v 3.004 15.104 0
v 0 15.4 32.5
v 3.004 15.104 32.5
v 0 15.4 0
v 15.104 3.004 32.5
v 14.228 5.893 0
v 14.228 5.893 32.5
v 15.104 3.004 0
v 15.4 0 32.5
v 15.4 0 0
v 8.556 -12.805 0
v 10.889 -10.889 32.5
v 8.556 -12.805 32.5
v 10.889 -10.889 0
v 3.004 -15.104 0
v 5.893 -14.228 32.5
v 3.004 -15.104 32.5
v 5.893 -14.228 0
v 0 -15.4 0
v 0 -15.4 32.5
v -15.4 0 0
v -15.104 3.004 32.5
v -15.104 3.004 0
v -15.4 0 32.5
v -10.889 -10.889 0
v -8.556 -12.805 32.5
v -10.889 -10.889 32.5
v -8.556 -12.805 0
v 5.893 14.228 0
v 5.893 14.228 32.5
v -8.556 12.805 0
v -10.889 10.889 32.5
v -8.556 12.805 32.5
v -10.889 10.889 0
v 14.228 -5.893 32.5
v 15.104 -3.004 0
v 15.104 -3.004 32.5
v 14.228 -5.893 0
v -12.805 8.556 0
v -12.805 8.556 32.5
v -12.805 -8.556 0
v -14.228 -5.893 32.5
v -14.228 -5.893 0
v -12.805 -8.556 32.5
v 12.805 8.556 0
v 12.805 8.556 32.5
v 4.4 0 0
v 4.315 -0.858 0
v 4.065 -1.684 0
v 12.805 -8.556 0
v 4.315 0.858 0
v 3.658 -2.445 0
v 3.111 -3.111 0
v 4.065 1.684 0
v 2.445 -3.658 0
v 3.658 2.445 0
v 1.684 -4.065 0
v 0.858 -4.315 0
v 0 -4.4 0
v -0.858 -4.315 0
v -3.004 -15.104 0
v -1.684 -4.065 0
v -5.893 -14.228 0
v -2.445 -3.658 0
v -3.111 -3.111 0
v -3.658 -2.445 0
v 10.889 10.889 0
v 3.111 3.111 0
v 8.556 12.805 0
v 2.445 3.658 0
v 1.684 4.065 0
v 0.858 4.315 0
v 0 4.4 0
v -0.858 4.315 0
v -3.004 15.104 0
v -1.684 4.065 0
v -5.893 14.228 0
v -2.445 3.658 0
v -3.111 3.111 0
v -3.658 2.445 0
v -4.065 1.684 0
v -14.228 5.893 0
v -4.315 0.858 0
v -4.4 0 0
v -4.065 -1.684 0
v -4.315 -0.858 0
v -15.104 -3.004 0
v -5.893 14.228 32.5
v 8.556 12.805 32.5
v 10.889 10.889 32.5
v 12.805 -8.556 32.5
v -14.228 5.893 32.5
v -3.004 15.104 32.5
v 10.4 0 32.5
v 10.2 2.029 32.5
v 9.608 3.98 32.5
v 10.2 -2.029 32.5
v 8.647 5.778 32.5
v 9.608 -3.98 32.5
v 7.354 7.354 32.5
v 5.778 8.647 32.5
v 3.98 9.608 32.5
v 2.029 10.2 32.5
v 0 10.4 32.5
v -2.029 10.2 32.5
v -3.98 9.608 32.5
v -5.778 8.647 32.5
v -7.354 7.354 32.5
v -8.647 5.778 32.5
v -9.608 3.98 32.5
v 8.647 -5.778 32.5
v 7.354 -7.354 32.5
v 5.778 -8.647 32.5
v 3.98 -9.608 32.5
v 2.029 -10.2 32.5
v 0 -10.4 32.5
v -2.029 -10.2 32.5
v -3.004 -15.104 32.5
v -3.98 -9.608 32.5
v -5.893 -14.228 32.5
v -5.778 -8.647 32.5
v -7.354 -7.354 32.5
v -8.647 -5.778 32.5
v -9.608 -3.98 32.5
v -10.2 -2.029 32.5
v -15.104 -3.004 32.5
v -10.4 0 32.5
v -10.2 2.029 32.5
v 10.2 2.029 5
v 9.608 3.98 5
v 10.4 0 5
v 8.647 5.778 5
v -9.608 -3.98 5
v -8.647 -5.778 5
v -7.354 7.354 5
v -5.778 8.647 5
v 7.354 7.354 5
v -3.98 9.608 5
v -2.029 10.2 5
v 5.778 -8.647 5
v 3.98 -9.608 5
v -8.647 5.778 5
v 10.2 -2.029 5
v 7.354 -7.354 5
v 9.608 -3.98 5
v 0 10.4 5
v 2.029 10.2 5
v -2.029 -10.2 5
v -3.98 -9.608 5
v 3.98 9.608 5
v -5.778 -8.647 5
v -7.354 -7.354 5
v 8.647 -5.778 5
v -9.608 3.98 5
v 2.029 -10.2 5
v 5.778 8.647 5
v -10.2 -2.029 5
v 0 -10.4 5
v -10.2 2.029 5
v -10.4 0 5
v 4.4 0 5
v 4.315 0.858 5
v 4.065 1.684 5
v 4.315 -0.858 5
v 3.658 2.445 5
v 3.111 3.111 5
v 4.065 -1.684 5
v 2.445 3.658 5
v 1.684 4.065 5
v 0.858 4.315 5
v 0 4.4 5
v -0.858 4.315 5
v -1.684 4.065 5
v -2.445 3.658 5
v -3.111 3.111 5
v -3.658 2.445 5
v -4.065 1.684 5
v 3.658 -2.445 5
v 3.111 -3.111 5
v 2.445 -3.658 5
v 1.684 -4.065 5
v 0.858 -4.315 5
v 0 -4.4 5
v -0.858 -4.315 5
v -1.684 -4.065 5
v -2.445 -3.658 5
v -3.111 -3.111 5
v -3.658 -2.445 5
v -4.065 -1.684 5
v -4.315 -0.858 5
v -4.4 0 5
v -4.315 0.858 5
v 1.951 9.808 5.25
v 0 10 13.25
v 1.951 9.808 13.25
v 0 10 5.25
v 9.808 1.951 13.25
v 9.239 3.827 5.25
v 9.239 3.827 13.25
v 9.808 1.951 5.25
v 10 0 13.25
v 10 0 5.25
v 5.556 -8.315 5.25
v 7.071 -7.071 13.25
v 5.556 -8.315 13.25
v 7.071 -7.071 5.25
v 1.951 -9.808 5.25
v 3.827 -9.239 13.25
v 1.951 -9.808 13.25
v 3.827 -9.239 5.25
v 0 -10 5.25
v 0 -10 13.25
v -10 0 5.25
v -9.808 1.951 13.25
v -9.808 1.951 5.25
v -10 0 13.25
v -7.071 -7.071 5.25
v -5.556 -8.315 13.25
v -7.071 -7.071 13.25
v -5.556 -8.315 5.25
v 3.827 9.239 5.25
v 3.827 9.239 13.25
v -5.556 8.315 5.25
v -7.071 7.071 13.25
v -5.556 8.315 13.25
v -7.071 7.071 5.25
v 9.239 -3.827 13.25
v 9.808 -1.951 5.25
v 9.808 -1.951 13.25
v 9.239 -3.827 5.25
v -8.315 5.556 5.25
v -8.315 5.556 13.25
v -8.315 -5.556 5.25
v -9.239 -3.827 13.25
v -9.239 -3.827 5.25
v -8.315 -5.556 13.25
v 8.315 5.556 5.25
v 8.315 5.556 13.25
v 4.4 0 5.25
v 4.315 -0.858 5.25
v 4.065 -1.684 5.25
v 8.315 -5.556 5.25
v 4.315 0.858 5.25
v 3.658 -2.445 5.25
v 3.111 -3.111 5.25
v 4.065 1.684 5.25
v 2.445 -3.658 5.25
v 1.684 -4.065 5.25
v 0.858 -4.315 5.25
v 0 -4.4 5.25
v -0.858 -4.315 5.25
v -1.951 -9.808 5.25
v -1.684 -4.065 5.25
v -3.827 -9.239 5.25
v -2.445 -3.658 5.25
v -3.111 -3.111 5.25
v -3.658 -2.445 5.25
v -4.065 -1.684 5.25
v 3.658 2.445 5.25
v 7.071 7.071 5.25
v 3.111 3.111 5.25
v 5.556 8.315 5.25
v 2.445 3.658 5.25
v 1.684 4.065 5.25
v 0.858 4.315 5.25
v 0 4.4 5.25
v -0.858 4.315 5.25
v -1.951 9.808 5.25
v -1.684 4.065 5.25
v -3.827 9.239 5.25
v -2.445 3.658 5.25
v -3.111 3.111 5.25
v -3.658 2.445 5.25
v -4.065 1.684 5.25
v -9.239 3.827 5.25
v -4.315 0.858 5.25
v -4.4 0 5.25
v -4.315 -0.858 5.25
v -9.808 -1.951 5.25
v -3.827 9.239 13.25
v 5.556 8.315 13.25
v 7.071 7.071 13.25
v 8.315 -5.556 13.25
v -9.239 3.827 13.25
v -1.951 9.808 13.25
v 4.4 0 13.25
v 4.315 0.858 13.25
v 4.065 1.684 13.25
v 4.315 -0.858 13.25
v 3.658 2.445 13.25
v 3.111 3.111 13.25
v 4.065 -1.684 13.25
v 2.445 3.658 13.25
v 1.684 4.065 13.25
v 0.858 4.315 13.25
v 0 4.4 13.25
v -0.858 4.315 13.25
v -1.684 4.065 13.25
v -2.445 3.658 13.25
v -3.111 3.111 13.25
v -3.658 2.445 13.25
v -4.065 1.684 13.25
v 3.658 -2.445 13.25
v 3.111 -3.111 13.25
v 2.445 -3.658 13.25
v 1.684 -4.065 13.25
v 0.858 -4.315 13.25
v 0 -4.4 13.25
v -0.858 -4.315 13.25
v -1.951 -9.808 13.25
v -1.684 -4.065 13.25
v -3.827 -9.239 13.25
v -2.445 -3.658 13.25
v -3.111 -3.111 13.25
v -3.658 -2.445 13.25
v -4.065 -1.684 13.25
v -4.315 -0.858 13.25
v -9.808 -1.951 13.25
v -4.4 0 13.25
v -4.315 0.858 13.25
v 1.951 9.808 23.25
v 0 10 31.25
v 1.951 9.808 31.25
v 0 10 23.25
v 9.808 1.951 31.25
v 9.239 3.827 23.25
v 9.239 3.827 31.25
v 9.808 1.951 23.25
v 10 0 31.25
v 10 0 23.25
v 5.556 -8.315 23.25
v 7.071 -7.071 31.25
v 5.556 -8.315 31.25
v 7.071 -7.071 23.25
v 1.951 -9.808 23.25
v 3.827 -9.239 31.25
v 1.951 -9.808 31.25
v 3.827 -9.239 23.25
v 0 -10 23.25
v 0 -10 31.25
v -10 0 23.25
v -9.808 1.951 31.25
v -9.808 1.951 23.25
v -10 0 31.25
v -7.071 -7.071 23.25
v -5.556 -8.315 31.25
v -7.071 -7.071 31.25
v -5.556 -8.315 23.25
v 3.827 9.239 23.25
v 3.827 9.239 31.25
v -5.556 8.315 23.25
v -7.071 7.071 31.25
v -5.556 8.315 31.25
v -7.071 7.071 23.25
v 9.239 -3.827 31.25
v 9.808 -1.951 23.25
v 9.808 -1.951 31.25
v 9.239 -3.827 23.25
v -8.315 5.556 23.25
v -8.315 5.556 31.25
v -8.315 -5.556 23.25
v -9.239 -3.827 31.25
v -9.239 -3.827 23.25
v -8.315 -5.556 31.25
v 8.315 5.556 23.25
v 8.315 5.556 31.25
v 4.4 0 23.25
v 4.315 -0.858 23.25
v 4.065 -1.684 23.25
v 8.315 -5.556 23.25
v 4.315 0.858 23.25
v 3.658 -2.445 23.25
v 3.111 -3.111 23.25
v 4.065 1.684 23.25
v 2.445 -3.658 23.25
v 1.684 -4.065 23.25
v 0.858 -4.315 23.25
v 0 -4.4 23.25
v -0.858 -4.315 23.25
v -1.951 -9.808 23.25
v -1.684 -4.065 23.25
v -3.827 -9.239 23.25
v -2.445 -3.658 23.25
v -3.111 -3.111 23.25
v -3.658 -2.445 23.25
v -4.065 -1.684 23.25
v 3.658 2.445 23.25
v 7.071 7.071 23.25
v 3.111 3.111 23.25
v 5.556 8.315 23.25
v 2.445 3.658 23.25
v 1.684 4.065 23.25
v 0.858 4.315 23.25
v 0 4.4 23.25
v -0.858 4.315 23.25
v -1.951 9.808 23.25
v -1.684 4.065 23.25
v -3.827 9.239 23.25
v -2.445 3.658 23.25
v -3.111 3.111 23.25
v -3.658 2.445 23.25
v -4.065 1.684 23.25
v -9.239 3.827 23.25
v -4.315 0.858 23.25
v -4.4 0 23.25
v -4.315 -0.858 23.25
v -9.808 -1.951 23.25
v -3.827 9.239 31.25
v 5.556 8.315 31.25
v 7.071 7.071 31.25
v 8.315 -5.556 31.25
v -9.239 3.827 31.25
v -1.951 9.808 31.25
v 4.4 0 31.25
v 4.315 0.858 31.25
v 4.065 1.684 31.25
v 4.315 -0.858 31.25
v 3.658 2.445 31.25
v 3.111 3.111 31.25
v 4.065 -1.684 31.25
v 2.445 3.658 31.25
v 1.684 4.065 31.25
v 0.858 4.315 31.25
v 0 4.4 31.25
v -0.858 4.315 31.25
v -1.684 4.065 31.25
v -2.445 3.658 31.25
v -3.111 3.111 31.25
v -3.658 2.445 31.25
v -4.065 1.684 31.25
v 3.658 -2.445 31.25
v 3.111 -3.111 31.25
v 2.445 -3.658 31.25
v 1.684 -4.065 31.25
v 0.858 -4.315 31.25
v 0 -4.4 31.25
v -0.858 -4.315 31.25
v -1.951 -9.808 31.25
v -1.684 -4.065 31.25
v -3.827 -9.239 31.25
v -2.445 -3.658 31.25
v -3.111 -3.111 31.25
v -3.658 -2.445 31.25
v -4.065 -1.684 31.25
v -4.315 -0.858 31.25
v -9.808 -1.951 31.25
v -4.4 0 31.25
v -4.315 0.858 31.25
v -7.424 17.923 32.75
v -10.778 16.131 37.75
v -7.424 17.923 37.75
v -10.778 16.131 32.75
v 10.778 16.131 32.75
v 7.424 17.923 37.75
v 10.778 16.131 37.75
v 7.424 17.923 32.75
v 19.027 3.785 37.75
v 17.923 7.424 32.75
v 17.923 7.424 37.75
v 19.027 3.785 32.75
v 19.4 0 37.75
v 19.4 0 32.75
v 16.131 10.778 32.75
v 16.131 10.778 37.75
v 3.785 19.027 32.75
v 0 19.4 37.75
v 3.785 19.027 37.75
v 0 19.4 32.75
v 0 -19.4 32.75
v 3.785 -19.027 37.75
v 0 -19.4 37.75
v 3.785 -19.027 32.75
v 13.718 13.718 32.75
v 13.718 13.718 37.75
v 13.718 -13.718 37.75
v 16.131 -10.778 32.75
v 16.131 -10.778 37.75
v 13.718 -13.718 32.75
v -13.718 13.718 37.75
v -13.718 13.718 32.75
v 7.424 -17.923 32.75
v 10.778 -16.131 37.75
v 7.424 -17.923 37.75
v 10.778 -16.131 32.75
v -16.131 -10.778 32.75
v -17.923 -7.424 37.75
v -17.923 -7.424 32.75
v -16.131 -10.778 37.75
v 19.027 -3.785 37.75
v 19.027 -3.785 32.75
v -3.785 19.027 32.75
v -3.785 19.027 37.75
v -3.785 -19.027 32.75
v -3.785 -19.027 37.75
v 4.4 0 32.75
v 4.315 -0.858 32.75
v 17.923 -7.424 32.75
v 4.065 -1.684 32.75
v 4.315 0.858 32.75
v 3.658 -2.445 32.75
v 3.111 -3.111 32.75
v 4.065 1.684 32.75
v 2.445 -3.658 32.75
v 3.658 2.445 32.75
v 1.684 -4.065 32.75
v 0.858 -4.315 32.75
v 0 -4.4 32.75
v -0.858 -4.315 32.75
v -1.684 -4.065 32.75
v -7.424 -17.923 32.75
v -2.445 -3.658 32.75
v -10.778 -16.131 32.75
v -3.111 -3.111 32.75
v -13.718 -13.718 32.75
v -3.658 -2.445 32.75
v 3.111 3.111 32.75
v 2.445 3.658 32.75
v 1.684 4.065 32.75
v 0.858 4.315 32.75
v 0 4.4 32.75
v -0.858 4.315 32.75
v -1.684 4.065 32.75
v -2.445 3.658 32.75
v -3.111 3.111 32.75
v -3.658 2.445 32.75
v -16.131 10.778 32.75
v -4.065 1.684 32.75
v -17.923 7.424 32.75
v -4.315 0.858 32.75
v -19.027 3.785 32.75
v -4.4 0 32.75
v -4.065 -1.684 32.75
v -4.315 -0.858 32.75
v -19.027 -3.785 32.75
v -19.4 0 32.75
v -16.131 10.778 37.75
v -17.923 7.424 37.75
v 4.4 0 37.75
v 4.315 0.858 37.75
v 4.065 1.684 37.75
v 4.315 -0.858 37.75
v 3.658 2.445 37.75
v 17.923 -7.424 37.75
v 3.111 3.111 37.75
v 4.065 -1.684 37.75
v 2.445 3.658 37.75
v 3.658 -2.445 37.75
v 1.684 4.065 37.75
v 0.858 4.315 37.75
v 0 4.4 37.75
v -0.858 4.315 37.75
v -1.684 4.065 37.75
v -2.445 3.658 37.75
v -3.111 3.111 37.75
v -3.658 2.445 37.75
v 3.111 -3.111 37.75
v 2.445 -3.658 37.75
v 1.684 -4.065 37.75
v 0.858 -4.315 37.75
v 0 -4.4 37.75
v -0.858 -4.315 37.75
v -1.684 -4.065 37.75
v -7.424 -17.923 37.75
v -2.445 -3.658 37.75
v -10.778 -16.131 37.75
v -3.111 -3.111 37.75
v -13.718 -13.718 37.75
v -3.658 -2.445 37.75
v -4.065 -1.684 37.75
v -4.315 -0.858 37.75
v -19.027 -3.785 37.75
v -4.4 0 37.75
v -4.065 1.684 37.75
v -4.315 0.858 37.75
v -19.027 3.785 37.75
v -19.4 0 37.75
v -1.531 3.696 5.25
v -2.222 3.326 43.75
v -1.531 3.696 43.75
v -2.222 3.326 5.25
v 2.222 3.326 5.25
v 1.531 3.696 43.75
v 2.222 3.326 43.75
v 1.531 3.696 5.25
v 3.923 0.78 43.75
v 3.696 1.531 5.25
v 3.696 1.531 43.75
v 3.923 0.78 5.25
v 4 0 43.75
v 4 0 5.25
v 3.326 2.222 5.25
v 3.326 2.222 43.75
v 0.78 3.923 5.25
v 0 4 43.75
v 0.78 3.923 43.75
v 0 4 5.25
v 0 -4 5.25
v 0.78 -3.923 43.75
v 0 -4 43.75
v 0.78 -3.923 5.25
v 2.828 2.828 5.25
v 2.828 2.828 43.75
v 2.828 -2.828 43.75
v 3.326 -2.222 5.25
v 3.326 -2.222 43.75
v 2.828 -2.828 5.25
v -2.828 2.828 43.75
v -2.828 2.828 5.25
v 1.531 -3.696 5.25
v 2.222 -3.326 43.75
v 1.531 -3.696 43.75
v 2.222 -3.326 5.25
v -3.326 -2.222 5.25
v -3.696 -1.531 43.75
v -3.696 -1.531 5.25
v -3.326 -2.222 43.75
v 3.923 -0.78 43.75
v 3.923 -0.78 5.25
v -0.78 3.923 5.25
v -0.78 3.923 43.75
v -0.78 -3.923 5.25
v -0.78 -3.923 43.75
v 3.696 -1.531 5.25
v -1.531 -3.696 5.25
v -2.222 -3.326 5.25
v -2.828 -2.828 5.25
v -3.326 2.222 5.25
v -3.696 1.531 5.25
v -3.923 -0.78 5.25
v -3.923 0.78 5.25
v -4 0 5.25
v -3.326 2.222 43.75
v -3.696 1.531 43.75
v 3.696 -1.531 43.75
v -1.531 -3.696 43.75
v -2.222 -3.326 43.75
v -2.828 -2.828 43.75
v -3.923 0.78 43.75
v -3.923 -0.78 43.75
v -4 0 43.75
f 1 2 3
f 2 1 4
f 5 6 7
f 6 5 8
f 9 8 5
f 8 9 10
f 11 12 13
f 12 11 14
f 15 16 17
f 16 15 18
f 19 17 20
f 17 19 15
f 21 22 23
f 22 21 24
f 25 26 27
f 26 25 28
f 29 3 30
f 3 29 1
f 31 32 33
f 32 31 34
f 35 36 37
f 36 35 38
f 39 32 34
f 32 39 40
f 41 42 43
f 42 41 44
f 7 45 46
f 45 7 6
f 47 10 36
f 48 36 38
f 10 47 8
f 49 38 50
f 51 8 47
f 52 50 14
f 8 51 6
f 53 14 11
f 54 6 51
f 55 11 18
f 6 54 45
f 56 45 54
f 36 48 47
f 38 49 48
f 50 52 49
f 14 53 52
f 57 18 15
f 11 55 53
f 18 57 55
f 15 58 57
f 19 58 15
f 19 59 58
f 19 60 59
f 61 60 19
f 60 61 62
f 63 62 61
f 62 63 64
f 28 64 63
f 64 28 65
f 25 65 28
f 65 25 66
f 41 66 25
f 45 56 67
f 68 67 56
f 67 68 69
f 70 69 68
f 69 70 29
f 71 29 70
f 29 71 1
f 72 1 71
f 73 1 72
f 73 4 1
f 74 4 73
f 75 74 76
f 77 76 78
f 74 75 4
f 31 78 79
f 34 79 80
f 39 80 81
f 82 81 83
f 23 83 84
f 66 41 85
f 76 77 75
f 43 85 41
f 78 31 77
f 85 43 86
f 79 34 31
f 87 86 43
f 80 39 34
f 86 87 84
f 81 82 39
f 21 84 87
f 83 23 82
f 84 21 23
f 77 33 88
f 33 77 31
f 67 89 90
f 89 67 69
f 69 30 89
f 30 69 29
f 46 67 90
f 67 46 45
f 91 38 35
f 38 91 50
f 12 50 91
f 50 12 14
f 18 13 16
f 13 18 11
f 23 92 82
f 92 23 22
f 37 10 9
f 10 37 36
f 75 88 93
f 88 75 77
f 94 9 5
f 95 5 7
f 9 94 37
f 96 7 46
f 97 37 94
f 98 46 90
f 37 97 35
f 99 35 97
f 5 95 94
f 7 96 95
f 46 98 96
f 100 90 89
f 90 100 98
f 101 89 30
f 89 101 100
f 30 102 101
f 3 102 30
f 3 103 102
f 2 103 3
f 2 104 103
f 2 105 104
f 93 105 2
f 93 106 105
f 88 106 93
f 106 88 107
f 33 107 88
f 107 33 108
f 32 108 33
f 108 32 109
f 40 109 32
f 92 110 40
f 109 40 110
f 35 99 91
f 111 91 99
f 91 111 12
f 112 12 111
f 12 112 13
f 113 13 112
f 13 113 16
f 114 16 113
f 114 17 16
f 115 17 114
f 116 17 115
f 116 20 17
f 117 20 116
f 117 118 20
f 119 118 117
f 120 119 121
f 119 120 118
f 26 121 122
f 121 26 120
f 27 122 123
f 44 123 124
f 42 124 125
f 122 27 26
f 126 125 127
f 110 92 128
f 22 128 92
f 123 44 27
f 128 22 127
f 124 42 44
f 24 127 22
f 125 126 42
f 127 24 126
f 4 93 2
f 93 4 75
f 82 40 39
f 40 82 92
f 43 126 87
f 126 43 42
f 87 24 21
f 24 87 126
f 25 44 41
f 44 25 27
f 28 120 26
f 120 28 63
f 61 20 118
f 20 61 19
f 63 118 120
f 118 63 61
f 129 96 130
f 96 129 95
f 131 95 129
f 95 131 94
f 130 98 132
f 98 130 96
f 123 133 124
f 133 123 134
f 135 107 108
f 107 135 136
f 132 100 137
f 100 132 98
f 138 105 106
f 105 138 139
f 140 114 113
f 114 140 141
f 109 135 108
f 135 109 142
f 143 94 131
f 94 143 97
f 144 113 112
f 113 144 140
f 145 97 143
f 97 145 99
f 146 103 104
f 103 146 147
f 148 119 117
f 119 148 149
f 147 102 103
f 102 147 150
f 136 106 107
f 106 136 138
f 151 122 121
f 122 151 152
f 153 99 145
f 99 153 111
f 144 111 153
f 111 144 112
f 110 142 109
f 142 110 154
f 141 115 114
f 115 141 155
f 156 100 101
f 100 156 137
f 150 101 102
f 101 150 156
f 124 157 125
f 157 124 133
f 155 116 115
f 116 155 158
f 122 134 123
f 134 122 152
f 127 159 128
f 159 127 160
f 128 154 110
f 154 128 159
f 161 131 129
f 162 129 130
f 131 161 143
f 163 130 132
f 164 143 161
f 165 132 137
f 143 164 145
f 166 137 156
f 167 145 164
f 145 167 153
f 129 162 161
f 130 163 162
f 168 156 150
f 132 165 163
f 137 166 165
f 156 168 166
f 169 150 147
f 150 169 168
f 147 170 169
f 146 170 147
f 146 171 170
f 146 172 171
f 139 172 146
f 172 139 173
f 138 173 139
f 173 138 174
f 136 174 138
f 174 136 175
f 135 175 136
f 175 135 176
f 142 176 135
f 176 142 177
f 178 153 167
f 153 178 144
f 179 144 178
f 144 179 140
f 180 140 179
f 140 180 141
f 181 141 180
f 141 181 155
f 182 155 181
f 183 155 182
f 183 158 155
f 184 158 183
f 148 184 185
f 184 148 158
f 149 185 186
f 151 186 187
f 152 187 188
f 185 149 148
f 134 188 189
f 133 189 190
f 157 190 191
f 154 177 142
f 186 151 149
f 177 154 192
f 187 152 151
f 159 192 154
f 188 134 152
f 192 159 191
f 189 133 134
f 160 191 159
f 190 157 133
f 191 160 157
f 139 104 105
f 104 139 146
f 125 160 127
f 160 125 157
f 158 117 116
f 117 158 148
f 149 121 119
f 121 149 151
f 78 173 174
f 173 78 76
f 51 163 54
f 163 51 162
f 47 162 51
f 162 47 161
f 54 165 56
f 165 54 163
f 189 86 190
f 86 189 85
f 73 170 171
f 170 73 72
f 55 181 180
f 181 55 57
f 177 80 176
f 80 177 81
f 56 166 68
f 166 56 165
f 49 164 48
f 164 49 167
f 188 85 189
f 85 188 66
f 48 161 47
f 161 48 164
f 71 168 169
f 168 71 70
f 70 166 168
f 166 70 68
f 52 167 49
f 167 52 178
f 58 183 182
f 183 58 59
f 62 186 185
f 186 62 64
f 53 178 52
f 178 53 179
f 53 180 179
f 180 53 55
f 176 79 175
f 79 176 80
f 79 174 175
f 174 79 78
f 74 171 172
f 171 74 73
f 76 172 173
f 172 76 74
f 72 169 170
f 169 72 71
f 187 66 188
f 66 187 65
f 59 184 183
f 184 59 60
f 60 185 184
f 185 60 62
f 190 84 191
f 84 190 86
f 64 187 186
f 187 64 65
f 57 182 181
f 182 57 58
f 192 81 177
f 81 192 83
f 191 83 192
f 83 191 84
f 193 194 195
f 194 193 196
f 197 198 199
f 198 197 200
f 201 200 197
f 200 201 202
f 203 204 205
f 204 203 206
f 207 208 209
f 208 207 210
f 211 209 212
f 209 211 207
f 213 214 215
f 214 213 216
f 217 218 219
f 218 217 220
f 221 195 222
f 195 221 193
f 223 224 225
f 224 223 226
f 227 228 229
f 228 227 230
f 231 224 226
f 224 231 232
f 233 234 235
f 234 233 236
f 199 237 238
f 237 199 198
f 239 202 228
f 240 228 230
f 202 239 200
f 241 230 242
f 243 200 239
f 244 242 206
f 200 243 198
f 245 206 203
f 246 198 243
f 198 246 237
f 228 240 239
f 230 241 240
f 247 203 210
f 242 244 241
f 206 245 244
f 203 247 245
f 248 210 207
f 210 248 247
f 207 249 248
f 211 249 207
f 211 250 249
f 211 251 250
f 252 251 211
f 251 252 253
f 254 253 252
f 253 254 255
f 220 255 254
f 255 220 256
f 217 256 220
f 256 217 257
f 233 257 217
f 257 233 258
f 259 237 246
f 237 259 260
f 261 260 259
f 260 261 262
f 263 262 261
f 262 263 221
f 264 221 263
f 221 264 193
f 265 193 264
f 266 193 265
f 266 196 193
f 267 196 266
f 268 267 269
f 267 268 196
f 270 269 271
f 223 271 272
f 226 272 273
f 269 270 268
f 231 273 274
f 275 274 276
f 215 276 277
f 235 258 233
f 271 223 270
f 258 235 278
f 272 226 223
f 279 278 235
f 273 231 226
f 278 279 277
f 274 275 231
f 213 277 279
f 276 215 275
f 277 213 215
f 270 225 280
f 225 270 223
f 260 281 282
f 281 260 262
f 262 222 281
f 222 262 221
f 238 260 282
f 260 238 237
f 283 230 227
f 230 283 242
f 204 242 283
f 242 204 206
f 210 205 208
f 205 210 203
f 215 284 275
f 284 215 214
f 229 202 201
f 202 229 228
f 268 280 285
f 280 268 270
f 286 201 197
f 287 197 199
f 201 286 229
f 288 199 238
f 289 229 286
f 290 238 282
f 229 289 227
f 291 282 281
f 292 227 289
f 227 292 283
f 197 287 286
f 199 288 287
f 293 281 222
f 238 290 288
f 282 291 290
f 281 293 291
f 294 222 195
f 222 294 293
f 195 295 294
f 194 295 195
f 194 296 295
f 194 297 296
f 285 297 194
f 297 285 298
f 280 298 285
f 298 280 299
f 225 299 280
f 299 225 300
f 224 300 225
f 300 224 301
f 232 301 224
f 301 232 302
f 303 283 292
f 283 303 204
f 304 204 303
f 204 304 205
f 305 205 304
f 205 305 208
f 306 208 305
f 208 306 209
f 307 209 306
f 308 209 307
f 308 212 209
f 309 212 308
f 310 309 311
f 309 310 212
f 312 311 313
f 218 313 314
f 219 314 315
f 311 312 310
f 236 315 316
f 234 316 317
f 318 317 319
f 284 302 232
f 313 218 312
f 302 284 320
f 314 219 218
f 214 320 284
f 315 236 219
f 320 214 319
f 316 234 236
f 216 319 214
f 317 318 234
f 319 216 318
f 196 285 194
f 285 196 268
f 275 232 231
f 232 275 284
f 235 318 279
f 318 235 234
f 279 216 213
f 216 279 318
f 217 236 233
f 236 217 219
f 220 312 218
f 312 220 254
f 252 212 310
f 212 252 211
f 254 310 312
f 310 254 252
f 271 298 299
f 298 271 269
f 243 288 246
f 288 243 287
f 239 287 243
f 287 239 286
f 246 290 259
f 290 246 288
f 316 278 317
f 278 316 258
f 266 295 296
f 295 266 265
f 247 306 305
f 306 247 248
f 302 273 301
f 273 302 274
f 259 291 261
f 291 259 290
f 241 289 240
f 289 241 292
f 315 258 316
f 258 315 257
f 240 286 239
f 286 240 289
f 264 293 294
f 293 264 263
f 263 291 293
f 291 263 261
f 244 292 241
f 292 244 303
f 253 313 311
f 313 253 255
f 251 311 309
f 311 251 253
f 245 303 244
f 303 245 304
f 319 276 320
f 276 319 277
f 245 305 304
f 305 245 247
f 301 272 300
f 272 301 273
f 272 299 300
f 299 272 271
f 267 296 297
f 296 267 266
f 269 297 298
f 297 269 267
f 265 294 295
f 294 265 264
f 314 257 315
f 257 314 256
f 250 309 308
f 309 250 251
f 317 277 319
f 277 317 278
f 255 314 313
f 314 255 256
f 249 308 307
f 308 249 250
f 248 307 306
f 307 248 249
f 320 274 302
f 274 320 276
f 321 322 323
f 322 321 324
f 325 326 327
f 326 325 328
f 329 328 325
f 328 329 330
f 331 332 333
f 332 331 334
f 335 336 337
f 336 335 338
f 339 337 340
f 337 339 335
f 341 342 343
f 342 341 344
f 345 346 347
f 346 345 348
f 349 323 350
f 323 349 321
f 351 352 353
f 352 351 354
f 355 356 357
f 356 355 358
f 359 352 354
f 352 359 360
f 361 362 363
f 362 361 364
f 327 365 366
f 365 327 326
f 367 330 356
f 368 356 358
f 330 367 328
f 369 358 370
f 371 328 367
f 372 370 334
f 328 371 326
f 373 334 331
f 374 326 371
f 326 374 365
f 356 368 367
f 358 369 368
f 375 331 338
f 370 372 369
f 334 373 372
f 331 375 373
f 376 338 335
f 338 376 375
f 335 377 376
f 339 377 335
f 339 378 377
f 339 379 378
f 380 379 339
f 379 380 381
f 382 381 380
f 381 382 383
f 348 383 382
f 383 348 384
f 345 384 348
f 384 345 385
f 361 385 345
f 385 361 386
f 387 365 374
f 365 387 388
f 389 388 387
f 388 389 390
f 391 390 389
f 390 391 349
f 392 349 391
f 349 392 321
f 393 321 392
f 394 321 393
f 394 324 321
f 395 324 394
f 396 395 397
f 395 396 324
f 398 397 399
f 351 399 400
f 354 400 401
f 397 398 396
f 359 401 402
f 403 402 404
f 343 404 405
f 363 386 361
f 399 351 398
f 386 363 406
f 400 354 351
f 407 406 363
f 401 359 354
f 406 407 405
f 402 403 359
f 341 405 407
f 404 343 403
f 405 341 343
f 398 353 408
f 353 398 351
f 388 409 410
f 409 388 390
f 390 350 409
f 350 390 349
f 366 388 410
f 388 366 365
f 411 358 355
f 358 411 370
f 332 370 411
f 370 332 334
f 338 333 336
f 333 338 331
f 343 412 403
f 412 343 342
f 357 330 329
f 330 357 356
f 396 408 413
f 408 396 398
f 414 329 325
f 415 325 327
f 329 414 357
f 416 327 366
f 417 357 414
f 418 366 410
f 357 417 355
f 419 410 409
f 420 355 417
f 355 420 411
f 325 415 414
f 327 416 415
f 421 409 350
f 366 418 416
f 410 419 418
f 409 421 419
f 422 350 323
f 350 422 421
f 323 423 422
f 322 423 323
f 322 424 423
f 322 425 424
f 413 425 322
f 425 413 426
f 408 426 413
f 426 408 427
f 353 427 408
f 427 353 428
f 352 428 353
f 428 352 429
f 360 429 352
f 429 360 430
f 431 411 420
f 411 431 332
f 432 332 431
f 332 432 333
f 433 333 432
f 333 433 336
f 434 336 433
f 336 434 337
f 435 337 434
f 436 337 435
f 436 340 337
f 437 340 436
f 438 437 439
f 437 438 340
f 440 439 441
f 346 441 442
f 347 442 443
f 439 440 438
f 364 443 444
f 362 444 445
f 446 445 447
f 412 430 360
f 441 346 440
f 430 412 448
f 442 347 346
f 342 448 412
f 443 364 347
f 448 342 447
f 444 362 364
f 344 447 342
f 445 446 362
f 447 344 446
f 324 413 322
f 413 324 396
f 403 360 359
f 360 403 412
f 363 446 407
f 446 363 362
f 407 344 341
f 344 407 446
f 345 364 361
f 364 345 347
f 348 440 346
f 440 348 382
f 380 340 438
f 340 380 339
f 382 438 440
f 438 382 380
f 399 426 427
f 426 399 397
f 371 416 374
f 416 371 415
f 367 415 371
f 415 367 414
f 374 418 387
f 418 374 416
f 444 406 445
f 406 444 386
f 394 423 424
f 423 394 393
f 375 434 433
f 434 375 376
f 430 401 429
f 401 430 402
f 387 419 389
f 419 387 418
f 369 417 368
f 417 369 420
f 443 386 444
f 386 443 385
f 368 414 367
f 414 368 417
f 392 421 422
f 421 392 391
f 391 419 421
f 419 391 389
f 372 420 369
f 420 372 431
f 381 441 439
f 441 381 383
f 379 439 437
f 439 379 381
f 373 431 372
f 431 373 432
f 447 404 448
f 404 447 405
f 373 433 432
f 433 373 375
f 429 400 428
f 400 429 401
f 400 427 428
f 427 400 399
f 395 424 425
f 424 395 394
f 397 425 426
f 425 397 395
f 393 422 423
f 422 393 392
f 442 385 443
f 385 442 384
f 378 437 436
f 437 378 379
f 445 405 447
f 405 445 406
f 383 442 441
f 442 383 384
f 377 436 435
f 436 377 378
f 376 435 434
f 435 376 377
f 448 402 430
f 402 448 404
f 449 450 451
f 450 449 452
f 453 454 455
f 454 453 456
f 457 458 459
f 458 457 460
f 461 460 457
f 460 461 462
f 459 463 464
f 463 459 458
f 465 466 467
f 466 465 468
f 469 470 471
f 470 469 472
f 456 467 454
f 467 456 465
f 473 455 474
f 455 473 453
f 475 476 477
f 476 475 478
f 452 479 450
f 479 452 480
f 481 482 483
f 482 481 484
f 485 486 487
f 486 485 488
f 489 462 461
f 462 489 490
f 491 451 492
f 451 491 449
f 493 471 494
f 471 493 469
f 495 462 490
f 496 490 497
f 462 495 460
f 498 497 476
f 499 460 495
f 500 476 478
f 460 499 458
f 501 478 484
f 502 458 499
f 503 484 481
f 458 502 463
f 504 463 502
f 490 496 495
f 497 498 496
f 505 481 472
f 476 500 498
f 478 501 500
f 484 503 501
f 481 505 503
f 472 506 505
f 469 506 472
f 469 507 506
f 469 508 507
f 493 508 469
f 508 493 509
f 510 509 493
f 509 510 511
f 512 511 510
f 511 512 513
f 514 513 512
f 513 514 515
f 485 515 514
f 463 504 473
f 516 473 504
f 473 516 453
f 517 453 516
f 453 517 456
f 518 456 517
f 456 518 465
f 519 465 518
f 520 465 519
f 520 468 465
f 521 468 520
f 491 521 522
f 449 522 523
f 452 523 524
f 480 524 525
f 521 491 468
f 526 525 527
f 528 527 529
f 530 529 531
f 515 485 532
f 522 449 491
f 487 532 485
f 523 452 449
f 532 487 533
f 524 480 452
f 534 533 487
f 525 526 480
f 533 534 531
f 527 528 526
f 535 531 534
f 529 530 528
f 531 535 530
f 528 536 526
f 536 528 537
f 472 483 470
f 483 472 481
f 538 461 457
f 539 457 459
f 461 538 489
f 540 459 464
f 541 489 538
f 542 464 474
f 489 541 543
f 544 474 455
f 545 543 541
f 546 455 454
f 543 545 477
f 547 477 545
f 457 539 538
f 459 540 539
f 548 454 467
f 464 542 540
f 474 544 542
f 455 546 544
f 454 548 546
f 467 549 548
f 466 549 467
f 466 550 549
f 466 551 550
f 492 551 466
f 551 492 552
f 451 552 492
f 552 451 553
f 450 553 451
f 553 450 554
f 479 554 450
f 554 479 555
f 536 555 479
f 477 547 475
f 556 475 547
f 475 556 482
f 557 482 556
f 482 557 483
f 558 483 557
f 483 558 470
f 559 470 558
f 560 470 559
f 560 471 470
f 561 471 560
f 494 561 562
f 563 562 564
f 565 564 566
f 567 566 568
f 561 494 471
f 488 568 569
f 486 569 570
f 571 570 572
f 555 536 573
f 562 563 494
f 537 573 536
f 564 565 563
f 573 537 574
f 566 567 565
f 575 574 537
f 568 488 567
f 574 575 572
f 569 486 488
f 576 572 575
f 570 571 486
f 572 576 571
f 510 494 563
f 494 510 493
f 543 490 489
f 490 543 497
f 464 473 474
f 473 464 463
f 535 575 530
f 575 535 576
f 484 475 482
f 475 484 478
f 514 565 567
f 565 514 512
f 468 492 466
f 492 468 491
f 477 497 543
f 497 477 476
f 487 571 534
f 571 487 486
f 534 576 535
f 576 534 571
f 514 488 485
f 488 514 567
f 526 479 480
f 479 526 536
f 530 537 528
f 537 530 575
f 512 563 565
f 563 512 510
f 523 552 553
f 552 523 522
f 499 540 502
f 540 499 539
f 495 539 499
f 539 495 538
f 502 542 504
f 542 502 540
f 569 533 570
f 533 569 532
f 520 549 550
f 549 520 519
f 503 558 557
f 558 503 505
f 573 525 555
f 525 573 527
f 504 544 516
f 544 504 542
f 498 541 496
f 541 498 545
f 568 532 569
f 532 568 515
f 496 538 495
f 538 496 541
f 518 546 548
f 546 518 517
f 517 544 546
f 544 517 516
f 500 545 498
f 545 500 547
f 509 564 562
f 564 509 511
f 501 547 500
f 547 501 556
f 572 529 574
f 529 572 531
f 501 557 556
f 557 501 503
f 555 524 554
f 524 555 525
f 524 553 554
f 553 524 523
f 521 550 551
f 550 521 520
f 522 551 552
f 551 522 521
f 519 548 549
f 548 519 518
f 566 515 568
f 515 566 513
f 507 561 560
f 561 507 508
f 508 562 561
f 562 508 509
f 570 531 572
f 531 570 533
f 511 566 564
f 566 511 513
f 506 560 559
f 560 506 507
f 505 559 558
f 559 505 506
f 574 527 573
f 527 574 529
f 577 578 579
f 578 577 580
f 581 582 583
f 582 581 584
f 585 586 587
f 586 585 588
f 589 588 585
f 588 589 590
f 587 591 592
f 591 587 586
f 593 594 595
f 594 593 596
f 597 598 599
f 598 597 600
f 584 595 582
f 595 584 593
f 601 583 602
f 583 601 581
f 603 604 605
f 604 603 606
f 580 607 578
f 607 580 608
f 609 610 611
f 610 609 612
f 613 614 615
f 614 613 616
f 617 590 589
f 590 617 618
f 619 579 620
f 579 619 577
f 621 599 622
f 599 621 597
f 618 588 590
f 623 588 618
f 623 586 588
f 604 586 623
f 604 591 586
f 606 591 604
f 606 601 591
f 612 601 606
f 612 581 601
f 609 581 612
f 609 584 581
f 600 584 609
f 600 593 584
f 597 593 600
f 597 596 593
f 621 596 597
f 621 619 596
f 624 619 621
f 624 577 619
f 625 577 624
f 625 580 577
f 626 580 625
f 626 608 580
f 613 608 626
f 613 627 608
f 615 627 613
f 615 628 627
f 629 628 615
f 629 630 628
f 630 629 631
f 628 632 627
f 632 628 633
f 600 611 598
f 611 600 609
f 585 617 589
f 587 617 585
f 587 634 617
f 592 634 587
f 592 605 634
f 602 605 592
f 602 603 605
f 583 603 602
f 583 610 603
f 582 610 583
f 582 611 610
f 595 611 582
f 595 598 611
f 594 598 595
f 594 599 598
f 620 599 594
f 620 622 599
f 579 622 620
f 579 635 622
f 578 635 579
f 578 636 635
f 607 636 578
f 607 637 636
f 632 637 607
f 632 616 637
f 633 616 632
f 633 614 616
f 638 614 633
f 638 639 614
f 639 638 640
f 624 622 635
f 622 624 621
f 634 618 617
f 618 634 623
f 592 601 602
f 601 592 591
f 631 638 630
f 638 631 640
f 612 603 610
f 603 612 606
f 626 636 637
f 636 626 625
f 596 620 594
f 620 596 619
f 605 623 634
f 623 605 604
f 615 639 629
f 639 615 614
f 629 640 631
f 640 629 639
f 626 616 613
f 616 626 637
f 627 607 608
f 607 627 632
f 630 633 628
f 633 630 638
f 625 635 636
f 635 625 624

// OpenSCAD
$fn = 32;

// ------------------------------------------------------------------------
// Shaft station: cup d30.8 x 32.5 mm, shaft d8
// Every part is its own module, assembly() places every instance.
// ------------------------------------------------------------------------

// --- part 1 ---
module housing_cup() {
  difference() {
    cylinder(h = 32.5, d = 30.8);
    translate([0, 0, 5]) cylinder(h = 28.5, d = 20.8);
    translate([0, 0, -1]) cylinder(h = 7, d = 8.8);
  }
}

// --- part 2 ---
module bearing_lower() {
  difference() {
      translate([0, 0, 0]) cylinder(h = 8, d = 20);
      translate([0, 0, -1]) cylinder(h = 10, d = 8.8);
    }
}

// --- part 3 ---
module bearing_upper() {
  difference() {
      translate([0, 0, 0]) cylinder(h = 8, d = 20);
      translate([0, 0, -1]) cylinder(h = 10, d = 8.8);
    }
}

// --- part 4 ---
module station_shaft() {
  translate([0, 0, -19.25]) cylinder(h = 38.5, d = 8);
}

// --- part 5 ---
module station_cover() {
  difference() {
    cylinder(h = 5, d = 38.8);
    translate([0, 0, -1]) cylinder(h = 7, d = 8.8);
  }
}

// --- assembly ---
module assembly() {
  color([0.80, 0.24, 0.20]) translate([0, 0, 0]) rotate([0, 0, 0]) housing_cup();
  color([0.20, 0.45, 0.75]) translate([0, 0, 5.25]) rotate([0, 0, 0]) bearing_lower();
  color([0.25, 0.62, 0.32]) translate([0, 0, 23.25]) rotate([0, 0, 0]) bearing_upper();
  color([0.92, 0.70, 0.18]) translate([0, 0, 24.5]) rotate([0, 0, 0]) station_shaft();
  color([0.58, 0.35, 0.70]) translate([0, 0, 32.75]) rotate([0, 0, 0]) station_cover();
}

assembly();
